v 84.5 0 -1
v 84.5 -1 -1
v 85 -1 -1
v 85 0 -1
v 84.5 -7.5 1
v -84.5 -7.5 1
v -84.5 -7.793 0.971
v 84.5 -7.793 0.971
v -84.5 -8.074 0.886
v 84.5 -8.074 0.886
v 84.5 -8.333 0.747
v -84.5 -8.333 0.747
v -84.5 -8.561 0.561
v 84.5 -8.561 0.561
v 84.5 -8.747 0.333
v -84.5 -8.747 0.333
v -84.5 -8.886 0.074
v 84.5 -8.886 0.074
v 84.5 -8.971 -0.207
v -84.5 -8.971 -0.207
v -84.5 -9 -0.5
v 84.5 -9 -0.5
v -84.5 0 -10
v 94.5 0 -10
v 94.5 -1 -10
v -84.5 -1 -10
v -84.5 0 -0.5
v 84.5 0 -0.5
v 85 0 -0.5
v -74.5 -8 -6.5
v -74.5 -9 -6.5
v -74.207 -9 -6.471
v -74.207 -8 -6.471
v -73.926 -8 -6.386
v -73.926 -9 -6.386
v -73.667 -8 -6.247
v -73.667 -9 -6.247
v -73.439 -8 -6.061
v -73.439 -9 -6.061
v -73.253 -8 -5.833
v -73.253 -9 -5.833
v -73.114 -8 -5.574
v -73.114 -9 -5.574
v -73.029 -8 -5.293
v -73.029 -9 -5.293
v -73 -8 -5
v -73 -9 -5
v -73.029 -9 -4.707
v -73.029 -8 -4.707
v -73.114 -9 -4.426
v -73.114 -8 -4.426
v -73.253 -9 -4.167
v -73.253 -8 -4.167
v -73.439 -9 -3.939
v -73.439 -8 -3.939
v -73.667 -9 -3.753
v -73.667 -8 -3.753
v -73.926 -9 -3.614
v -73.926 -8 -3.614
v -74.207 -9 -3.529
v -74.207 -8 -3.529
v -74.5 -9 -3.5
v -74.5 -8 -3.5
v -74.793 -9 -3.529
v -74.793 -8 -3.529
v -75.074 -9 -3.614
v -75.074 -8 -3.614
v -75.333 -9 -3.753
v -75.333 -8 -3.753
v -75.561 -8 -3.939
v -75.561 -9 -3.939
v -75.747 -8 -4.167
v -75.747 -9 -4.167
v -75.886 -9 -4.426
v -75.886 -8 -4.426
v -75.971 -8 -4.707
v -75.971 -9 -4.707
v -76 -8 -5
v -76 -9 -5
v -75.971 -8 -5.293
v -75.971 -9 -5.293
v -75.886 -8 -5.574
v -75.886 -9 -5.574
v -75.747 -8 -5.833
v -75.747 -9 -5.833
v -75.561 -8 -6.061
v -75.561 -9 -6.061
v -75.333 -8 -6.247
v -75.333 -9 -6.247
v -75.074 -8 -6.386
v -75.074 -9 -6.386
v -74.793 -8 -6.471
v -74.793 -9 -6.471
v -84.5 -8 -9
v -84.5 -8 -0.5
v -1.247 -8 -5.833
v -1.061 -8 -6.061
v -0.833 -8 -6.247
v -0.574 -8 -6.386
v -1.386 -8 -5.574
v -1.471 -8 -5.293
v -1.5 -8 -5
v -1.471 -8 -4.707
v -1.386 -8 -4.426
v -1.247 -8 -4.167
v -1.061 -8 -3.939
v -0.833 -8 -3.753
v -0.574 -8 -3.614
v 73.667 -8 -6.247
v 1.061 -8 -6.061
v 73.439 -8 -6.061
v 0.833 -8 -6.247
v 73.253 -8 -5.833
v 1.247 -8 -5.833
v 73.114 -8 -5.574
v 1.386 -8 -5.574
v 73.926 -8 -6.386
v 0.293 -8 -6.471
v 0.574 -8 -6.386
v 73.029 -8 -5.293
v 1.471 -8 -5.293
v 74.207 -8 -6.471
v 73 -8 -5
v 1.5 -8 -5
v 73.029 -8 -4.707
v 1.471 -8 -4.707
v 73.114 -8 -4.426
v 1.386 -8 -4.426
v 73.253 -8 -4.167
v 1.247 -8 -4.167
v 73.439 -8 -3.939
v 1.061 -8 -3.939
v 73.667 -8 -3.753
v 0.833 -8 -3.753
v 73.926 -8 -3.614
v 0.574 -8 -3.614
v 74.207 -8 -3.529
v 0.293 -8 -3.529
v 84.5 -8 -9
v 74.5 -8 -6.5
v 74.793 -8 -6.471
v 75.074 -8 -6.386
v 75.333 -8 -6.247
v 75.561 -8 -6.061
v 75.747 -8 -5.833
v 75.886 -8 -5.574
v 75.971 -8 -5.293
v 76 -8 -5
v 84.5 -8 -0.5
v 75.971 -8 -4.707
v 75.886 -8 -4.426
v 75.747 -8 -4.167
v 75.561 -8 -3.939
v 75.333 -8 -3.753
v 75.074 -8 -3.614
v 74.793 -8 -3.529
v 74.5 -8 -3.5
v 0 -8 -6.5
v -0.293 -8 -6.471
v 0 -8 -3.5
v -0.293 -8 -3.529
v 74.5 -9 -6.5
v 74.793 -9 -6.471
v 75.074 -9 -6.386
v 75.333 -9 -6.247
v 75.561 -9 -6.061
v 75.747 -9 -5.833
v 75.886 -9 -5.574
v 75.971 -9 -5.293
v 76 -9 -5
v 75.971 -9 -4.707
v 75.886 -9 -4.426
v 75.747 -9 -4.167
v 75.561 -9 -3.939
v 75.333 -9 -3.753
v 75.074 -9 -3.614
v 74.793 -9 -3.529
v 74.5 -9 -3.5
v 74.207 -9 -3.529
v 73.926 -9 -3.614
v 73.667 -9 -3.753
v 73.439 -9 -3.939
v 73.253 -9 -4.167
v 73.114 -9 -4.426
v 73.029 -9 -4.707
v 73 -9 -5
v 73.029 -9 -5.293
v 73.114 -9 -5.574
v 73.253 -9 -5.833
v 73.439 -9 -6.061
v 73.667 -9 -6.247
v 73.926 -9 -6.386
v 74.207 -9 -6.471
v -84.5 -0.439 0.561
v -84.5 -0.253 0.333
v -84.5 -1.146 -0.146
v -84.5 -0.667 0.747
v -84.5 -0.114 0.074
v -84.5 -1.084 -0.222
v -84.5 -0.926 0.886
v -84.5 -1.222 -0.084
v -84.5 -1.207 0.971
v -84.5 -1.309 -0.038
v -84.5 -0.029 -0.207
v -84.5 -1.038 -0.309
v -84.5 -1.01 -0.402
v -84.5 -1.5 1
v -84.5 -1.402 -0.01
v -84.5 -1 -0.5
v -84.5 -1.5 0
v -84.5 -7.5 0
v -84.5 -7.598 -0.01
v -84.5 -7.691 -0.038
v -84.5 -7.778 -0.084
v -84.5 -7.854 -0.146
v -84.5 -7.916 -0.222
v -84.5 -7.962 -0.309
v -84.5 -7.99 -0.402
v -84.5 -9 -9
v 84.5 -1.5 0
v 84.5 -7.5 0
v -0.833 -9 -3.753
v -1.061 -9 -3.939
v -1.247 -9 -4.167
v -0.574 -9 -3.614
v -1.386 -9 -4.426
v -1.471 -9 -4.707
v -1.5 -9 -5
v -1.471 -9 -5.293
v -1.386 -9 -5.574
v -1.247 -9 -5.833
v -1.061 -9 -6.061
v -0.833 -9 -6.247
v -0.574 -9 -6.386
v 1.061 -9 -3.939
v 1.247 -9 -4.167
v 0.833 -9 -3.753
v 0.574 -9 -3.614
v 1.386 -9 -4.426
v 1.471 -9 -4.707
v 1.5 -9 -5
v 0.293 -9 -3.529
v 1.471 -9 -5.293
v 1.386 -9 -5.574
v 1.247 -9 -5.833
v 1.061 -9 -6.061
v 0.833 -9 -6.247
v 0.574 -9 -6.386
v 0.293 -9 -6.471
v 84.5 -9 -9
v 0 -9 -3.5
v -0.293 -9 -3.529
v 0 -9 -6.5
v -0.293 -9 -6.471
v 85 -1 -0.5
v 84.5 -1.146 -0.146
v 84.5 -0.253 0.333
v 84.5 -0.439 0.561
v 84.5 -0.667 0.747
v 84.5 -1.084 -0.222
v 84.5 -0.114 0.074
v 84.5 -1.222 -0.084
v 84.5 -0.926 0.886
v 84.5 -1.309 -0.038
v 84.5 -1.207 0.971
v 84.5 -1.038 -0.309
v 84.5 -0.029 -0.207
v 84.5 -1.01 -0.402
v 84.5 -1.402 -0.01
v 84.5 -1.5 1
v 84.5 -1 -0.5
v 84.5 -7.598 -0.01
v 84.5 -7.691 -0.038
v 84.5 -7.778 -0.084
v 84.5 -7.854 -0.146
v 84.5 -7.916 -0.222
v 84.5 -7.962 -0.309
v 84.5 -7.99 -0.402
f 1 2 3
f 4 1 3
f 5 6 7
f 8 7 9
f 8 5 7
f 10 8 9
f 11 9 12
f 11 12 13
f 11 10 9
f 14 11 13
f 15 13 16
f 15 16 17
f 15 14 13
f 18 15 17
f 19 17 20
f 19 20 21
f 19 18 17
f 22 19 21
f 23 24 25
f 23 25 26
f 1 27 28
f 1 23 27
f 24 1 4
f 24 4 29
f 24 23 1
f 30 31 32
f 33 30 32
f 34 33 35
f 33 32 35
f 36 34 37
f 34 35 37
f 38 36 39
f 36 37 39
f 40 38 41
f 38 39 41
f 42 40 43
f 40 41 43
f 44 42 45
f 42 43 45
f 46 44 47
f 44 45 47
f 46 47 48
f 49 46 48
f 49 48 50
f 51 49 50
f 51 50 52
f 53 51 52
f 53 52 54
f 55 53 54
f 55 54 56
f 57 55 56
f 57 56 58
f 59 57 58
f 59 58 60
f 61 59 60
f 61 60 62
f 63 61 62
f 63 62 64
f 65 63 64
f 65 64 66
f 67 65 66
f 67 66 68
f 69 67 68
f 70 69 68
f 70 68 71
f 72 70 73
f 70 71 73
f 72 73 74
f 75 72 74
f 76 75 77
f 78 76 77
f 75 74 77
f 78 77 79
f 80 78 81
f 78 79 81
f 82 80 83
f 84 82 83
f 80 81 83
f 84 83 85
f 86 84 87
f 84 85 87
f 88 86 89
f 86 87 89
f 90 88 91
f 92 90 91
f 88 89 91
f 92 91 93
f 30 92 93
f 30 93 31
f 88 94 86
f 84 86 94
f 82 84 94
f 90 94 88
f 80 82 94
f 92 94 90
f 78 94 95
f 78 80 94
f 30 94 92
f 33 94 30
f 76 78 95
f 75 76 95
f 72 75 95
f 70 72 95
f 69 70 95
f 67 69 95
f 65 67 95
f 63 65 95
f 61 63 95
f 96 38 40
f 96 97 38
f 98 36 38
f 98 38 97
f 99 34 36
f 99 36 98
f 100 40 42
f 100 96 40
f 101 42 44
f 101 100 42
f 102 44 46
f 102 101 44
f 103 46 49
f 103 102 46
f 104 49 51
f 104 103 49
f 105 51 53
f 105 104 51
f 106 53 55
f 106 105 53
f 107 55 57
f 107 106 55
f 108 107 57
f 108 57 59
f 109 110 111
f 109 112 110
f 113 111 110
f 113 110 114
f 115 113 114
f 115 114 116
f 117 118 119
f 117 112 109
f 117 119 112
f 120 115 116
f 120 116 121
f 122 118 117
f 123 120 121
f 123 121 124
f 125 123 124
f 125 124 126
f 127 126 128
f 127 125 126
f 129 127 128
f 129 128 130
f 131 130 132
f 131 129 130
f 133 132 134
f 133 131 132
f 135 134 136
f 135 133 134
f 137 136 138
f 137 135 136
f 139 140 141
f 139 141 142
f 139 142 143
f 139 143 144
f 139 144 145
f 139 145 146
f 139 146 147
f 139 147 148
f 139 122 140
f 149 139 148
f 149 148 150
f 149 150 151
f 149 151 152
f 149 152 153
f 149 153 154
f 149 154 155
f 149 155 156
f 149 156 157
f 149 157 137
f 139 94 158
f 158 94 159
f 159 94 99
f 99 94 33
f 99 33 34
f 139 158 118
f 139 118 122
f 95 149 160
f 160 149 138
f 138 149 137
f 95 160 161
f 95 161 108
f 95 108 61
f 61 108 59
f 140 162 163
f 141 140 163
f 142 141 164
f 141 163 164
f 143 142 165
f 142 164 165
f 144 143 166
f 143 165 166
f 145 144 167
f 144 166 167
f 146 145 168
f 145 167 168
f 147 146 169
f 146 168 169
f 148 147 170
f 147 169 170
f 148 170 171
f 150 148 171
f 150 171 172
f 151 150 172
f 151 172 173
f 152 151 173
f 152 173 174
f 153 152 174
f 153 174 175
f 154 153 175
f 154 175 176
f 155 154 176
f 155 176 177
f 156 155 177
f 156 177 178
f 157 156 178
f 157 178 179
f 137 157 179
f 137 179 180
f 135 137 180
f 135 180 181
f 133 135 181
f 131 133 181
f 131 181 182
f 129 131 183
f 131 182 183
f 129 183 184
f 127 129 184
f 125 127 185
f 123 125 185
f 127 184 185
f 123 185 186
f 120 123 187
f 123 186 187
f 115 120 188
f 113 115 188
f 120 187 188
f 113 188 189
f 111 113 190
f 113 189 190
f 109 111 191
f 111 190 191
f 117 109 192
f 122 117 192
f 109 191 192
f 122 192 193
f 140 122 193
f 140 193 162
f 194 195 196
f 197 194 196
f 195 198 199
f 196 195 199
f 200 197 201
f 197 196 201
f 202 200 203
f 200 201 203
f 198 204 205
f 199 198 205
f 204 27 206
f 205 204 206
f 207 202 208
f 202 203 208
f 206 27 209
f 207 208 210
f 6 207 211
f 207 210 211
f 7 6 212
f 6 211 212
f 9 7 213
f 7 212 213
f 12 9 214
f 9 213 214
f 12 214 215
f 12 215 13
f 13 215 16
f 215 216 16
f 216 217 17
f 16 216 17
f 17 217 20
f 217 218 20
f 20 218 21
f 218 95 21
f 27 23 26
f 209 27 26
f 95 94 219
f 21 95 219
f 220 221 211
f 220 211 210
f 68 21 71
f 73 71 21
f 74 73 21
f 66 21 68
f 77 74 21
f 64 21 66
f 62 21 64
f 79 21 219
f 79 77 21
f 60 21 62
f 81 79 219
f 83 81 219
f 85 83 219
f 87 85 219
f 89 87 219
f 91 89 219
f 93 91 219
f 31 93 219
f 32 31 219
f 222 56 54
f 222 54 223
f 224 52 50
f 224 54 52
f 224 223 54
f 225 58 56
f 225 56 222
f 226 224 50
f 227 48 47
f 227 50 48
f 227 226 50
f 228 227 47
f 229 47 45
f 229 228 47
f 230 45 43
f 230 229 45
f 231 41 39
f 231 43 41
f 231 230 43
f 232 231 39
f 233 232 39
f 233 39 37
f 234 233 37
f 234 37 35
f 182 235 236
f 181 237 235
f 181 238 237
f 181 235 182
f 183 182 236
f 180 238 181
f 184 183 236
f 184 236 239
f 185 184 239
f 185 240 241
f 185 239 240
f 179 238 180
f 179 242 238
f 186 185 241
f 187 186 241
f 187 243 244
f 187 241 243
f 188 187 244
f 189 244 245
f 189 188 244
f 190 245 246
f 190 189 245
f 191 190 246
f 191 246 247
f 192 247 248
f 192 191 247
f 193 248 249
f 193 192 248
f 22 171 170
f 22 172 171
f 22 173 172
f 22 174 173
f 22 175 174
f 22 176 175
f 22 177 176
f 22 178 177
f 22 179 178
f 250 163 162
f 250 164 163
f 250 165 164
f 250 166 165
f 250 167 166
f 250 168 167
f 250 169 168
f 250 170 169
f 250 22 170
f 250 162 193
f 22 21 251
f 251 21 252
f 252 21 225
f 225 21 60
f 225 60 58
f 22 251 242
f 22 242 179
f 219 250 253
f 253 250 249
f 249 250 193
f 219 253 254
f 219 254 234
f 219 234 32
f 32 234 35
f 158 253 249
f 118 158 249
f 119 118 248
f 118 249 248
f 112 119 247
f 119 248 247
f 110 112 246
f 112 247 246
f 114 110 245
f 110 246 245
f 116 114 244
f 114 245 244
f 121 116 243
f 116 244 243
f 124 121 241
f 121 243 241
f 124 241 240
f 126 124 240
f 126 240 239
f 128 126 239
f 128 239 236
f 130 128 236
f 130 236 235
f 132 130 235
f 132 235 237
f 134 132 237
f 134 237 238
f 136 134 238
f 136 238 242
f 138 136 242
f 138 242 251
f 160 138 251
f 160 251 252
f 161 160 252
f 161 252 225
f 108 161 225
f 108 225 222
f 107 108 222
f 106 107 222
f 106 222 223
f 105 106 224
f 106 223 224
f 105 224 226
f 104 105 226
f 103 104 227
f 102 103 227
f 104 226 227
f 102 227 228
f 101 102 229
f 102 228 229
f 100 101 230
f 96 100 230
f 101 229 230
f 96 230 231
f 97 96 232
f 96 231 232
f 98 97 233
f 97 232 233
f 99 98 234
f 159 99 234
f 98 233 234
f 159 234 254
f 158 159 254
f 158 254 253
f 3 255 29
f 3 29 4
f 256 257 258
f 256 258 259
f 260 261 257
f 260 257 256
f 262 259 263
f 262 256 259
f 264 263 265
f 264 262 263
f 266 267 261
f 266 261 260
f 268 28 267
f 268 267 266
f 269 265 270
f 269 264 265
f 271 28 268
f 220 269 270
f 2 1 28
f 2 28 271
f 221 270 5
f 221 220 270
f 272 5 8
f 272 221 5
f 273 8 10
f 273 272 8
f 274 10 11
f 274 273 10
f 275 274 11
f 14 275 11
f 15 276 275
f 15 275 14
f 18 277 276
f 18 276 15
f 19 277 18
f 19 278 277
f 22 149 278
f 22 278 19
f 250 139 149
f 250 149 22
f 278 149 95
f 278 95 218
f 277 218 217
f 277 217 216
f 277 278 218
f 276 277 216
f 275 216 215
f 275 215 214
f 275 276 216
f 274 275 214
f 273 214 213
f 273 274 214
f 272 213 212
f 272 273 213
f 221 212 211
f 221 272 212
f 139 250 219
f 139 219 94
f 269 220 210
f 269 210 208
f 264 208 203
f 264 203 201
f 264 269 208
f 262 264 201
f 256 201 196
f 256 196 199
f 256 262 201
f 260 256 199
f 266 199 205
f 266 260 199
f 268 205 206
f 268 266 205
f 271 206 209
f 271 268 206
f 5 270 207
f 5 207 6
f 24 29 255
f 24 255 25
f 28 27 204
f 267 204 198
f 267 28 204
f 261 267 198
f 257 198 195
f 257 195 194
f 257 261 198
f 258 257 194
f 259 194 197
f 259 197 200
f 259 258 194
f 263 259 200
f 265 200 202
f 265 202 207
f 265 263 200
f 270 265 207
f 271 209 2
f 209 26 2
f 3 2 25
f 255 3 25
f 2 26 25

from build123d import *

# Parameters (mm, degrees)
BASE_FLANGE1_DEPTH            = 1
EDGE_FLANGE1_STRIP_W          = 5
EDGE_FLANGE1_STRIP_H          = 1
EDGE_FLANGE1_STRIP_CUT_DEPTH  = 169
EDGE_FLANGE1_RELIEF_W         = 5.5
EDGE_FLANGE1_RELIEF_H         = 0.5
EDGE_FLANGE1_RELIEF_CUT_DEPTH = 1
EDGE_FLANGE1_DEPTH            = 169
EDGE_FLANGE2_STRIP_W          = 5
EDGE_FLANGE2_STRIP_H          = 1
EDGE_FLANGE2_STRIP_CUT_DEPTH  = 169
EDGE_FLANGE2_DEPTH            = 169
SKETCH12_R                    = 1.5
CUT_EXTRUDE1_DEPTH            = 3


# Sheet-metal steps are written as plain solids
with BuildPart() as part:
    # Sketch1 → Base-Flange1 (new body)
    with BuildSketch(Plane(origin=(0, 0, 0), x_dir=(1, 0, 0), z_dir=(0, 1, 0))):
        Polygon((-84.5, 0), (84.5, 0), (94.5, 10), (-84.5, 10), align=None)
    extrude(amount=-BASE_FLANGE1_DEPTH)

    # Edge-Flange1 strip (across the edge) → Edge-Flange1 strip cut (cut)
    with BuildSketch(Plane(origin=(84.5, -1, 0), x_dir=(0, 0, -1), z_dir=(-1, 0, 0))):
        with Locations((-2, -0.5)):
            Rectangle(EDGE_FLANGE1_STRIP_W, EDGE_FLANGE1_STRIP_H)
    extrude(amount=EDGE_FLANGE1_STRIP_CUT_DEPTH, mode=Mode.SUBTRACT)

    # Edge-Flange1 relief (on the sheet) → Edge-Flange1 relief cut (cut)
    with BuildSketch(Plane(origin=(84.5, -1, -0.5), x_dir=(0, 0, -1), z_dir=(0, -1, 0))):
        with Locations((-2.25, 0.25)):
            Rectangle(EDGE_FLANGE1_RELIEF_W, EDGE_FLANGE1_RELIEF_H)
    extrude(amount=-EDGE_FLANGE1_RELIEF_CUT_DEPTH, mode=Mode.SUBTRACT)

    # Edge-Flange1 section (across the edge) → Edge-Flange1 (add)
    with BuildSketch(Plane(origin=(84.5, -1, 0), x_dir=(0, 0, -1), z_dir=(-1, 0, 0))):
        with BuildLine():
            Line((-1, 0.5), (-1, 7))
            Line((-1, 7), (0, 7))
            Line((0, 7), (0, 0.5))
            ThreePointArc((0, 0.5), (0.146446609, 0.146446609), (0.5, 0))
            Line((0.5, 0), (0.5, -1))
            ThreePointArc((0.5, -1), (-0.560660172, -0.560660172), (-1, 0.5))
        make_face()
    extrude(amount=EDGE_FLANGE1_DEPTH)

    # Edge-Flange2 strip (across the edge) → Edge-Flange2 strip cut (cut)
    with BuildSketch(Plane(origin=(84.5, -8, 0), x_dir=(0, 1, 0), z_dir=(-1, 0, 0))):
        with Locations((-2, -0.5)):
            Rectangle(EDGE_FLANGE2_STRIP_W, EDGE_FLANGE2_STRIP_H)
    extrude(amount=EDGE_FLANGE2_STRIP_CUT_DEPTH, mode=Mode.SUBTRACT)

    # Edge-Flange2 section (across the edge) → Edge-Flange2 (add)
    with BuildSketch(Plane(origin=(84.5, -8, 0), x_dir=(0, 1, 0), z_dir=(-1, 0, 0))):
        with BuildLine():
            Line((-1, 0.5), (-1, 9))
            Line((-1, 9), (0, 9))
            Line((0, 9), (0, 0.5))
            ThreePointArc((0, 0.5), (0.146446609, 0.146446609), (0.5, 0))
            Line((0.5, 0), (0.5, -1))
            ThreePointArc((0.5, -1), (-0.560660172, -0.560660172), (-1, 0.5))
        make_face()
    extrude(amount=EDGE_FLANGE2_DEPTH)

    # Sketch12 → Cut-Extrude1 (cut)
    with BuildSketch(Plane.XZ.offset(9)):
        with Locations(Location((-74.5, -5, 0), (0, 0, 270))):
            Circle(SKETCH12_R)
        with Locations(Location((0, -5, 0), (0, 0, 270))):
            Circle(SKETCH12_R)
        with Locations(Location((74.5, -5, 0), (0, 0, 270))):
            Circle(SKETCH12_R)
    extrude(amount=-CUT_EXTRUDE1_DEPTH, mode=Mode.SUBTRACT)


solid = part.part
